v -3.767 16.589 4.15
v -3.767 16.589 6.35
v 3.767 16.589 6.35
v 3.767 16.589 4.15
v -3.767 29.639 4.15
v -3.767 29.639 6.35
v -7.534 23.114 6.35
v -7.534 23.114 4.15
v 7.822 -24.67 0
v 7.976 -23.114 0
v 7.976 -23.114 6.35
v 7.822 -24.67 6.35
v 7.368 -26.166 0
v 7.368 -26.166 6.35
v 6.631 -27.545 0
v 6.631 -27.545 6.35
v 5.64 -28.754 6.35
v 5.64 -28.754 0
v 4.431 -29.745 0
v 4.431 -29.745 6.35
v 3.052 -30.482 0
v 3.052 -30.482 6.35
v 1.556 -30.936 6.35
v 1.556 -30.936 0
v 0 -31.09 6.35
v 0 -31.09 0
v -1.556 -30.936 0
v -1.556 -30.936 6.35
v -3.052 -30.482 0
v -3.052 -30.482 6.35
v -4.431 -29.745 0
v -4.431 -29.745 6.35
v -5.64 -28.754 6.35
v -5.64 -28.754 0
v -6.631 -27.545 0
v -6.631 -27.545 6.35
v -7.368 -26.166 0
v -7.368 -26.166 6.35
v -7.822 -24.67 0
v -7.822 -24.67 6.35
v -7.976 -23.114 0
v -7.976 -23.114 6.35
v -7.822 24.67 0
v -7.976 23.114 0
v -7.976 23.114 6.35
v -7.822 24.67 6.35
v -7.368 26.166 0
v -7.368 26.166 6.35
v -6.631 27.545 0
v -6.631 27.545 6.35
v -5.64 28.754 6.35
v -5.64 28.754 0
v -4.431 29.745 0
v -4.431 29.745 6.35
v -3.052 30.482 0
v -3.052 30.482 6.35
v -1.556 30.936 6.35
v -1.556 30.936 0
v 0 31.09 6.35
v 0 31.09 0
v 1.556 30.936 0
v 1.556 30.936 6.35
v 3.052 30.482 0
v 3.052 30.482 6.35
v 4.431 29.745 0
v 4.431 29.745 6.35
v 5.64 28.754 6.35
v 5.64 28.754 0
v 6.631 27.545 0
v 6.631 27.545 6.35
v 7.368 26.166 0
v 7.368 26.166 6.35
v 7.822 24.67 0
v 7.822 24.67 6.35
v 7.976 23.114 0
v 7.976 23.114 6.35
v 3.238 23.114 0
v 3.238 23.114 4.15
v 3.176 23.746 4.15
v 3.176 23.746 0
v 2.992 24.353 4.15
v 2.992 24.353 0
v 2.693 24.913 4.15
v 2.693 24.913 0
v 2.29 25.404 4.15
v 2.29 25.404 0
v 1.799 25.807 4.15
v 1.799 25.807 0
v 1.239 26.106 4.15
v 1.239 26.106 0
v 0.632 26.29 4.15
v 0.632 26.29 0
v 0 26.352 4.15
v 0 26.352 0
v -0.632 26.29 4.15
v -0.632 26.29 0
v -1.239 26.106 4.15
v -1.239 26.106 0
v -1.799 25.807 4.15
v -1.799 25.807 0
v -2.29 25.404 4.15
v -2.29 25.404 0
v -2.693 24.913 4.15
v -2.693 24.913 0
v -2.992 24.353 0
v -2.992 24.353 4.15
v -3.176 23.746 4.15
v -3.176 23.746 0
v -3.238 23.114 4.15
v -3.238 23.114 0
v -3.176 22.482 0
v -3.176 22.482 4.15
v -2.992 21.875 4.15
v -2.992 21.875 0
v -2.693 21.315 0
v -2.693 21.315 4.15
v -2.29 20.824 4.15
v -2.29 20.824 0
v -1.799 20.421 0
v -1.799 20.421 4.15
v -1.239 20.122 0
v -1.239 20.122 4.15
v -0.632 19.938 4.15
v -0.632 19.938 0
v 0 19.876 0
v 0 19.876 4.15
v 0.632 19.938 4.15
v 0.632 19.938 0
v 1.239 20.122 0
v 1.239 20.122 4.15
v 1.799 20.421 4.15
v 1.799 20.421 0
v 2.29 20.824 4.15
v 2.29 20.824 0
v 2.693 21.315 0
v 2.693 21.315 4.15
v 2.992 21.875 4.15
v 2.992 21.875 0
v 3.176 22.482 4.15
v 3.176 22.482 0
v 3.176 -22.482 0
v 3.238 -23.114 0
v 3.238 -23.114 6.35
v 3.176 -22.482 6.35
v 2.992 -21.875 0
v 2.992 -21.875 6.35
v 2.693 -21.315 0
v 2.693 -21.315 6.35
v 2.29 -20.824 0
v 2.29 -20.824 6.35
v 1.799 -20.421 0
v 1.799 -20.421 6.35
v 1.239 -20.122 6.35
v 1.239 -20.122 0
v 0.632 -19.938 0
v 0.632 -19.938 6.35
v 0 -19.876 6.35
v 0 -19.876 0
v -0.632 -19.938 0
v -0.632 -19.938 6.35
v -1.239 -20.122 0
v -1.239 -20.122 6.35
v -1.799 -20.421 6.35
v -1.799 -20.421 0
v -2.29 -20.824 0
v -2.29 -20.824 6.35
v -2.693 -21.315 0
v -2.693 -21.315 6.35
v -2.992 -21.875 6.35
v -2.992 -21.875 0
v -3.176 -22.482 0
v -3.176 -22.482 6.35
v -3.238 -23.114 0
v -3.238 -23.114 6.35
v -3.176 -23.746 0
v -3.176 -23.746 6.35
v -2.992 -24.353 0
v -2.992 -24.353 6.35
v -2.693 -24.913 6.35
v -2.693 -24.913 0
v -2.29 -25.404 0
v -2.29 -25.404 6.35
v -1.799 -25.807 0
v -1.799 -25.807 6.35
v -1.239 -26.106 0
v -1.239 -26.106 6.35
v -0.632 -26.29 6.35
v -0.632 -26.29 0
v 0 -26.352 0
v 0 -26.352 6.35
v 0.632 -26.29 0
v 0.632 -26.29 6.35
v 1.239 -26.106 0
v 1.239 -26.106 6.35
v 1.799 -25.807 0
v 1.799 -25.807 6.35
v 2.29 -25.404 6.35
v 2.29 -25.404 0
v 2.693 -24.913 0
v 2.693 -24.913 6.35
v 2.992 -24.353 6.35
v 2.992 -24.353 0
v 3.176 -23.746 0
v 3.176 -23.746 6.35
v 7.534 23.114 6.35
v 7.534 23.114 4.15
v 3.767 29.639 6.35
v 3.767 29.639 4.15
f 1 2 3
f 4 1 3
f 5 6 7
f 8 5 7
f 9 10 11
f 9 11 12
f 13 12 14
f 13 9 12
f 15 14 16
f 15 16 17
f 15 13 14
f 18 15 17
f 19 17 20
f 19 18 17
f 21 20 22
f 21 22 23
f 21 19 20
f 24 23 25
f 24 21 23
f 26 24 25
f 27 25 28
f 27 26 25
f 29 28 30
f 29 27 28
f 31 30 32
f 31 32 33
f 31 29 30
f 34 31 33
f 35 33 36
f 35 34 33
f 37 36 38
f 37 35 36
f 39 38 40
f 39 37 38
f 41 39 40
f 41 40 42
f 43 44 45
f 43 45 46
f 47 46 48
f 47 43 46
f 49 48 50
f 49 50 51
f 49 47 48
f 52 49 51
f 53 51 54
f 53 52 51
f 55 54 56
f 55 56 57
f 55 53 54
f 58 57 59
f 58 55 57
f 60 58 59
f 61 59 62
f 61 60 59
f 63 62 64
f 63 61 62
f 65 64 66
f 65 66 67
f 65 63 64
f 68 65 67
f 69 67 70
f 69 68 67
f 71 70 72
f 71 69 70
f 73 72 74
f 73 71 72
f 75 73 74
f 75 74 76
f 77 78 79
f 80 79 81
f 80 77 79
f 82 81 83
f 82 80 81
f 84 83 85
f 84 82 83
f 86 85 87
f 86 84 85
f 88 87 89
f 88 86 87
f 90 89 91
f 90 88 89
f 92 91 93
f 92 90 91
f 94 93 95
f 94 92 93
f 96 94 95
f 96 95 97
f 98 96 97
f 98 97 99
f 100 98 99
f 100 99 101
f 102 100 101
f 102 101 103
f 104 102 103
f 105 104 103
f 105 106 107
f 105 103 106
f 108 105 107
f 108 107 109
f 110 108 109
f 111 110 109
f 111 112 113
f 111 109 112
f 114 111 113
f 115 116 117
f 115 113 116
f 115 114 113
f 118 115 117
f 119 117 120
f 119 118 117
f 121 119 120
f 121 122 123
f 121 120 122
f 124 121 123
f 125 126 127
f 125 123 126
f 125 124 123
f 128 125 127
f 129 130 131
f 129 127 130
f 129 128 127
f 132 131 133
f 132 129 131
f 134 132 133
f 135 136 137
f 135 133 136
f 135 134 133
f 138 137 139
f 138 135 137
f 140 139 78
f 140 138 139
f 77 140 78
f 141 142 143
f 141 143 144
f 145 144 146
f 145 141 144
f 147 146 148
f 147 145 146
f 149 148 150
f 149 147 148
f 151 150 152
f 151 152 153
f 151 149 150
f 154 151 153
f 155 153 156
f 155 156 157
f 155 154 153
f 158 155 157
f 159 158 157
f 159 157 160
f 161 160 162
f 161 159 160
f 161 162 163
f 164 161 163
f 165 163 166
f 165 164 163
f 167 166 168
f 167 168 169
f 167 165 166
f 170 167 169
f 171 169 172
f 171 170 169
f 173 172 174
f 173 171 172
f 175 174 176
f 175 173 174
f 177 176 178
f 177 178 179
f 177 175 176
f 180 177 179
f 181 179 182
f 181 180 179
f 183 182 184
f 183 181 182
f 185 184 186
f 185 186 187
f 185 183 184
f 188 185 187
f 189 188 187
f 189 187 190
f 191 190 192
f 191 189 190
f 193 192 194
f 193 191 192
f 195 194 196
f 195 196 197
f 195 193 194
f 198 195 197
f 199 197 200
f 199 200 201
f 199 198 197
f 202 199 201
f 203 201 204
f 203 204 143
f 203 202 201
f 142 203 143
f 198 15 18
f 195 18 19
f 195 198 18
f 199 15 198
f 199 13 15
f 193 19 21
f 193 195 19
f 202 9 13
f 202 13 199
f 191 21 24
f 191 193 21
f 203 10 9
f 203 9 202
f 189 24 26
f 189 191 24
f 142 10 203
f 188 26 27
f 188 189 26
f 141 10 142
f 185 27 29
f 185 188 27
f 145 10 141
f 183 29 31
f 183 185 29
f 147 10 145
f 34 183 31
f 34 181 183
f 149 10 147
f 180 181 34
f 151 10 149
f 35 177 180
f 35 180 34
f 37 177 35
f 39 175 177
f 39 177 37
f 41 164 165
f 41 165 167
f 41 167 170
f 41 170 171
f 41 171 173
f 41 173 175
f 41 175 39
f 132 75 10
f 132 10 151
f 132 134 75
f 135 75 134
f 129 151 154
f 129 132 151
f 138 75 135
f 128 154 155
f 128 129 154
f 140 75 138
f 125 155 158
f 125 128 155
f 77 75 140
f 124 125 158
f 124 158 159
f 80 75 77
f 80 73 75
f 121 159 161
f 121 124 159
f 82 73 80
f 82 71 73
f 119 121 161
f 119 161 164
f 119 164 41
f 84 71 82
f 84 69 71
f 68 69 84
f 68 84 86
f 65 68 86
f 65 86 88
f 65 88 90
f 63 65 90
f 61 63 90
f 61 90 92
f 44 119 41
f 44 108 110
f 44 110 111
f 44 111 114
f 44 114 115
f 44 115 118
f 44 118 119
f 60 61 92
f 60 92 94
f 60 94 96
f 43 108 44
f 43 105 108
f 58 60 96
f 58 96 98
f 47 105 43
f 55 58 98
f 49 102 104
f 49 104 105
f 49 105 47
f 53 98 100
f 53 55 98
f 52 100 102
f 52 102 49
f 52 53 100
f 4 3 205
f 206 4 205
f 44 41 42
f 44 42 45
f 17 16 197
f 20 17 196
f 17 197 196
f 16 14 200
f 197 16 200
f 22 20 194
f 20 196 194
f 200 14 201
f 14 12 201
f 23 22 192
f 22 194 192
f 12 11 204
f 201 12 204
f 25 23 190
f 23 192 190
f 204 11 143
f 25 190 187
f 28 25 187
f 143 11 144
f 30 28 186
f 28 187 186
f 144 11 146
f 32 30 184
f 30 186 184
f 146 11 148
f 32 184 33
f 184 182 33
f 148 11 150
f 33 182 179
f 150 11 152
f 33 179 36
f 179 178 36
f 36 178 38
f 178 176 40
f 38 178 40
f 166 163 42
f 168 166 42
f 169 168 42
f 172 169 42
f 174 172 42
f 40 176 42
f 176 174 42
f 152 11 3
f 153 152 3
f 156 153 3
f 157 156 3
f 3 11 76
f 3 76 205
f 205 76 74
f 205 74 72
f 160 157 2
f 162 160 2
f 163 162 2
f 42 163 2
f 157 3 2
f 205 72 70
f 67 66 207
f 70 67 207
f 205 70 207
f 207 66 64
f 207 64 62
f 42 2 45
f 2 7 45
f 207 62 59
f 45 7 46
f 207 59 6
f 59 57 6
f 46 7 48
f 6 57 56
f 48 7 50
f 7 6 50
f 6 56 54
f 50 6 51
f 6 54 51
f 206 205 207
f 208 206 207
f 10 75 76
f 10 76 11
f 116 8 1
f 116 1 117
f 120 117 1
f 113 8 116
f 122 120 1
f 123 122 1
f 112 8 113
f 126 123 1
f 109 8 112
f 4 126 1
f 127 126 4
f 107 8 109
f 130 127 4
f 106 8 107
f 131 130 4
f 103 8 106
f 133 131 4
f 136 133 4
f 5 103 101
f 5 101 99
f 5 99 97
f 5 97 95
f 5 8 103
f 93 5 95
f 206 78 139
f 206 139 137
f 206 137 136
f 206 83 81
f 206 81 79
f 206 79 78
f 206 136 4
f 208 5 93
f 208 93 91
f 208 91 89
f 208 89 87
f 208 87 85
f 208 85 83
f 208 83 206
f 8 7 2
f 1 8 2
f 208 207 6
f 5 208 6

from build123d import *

# Parameters (mm, degrees)
SKETCH1_R           = 3.2385
BOSS_EXTRUDE1_DEPTH = 6.35
CUT_EXTRUDE1_DEPTH  = 2.2


with BuildPart() as part:
    # Sketch1 → Boss-Extrude1 (new body)
    with BuildSketch(Plane.XY):
        with BuildLine():
            Line((7.9756, 23.114), (7.9756, -23.114))
            ThreePointArc((7.9756, -23.114), (0, -31.0896), (-7.9756, -23.114))
            Line((-7.9756, -23.114), (-7.9756, 23.114))
            ThreePointArc((-7.9756, 23.114), (0, 31.0896), (7.9756, 23.114))
        make_face()
        with Locations((0, 23.114)):
            Circle(SKETCH1_R, mode=Mode.SUBTRACT)
        with Locations((0, -23.114)):
            Circle(SKETCH1_R, mode=Mode.SUBTRACT)
    extrude(amount=BOSS_EXTRUDE1_DEPTH)

    # Sketch2 → Cut-Extrude1 (cut)
    with BuildSketch(Plane.XY.offset(6.35)):
        Polygon((-7.534421013, 23.114), (-3.767210506, 16.589), (3.767210506, 16.589), (7.534421013, 23.114), (3.767210506, 29.639), (-3.767210506, 29.639), align=None)
    extrude(amount=-CUT_EXTRUDE1_DEPTH, mode=Mode.SUBTRACT)


solid = part.part
